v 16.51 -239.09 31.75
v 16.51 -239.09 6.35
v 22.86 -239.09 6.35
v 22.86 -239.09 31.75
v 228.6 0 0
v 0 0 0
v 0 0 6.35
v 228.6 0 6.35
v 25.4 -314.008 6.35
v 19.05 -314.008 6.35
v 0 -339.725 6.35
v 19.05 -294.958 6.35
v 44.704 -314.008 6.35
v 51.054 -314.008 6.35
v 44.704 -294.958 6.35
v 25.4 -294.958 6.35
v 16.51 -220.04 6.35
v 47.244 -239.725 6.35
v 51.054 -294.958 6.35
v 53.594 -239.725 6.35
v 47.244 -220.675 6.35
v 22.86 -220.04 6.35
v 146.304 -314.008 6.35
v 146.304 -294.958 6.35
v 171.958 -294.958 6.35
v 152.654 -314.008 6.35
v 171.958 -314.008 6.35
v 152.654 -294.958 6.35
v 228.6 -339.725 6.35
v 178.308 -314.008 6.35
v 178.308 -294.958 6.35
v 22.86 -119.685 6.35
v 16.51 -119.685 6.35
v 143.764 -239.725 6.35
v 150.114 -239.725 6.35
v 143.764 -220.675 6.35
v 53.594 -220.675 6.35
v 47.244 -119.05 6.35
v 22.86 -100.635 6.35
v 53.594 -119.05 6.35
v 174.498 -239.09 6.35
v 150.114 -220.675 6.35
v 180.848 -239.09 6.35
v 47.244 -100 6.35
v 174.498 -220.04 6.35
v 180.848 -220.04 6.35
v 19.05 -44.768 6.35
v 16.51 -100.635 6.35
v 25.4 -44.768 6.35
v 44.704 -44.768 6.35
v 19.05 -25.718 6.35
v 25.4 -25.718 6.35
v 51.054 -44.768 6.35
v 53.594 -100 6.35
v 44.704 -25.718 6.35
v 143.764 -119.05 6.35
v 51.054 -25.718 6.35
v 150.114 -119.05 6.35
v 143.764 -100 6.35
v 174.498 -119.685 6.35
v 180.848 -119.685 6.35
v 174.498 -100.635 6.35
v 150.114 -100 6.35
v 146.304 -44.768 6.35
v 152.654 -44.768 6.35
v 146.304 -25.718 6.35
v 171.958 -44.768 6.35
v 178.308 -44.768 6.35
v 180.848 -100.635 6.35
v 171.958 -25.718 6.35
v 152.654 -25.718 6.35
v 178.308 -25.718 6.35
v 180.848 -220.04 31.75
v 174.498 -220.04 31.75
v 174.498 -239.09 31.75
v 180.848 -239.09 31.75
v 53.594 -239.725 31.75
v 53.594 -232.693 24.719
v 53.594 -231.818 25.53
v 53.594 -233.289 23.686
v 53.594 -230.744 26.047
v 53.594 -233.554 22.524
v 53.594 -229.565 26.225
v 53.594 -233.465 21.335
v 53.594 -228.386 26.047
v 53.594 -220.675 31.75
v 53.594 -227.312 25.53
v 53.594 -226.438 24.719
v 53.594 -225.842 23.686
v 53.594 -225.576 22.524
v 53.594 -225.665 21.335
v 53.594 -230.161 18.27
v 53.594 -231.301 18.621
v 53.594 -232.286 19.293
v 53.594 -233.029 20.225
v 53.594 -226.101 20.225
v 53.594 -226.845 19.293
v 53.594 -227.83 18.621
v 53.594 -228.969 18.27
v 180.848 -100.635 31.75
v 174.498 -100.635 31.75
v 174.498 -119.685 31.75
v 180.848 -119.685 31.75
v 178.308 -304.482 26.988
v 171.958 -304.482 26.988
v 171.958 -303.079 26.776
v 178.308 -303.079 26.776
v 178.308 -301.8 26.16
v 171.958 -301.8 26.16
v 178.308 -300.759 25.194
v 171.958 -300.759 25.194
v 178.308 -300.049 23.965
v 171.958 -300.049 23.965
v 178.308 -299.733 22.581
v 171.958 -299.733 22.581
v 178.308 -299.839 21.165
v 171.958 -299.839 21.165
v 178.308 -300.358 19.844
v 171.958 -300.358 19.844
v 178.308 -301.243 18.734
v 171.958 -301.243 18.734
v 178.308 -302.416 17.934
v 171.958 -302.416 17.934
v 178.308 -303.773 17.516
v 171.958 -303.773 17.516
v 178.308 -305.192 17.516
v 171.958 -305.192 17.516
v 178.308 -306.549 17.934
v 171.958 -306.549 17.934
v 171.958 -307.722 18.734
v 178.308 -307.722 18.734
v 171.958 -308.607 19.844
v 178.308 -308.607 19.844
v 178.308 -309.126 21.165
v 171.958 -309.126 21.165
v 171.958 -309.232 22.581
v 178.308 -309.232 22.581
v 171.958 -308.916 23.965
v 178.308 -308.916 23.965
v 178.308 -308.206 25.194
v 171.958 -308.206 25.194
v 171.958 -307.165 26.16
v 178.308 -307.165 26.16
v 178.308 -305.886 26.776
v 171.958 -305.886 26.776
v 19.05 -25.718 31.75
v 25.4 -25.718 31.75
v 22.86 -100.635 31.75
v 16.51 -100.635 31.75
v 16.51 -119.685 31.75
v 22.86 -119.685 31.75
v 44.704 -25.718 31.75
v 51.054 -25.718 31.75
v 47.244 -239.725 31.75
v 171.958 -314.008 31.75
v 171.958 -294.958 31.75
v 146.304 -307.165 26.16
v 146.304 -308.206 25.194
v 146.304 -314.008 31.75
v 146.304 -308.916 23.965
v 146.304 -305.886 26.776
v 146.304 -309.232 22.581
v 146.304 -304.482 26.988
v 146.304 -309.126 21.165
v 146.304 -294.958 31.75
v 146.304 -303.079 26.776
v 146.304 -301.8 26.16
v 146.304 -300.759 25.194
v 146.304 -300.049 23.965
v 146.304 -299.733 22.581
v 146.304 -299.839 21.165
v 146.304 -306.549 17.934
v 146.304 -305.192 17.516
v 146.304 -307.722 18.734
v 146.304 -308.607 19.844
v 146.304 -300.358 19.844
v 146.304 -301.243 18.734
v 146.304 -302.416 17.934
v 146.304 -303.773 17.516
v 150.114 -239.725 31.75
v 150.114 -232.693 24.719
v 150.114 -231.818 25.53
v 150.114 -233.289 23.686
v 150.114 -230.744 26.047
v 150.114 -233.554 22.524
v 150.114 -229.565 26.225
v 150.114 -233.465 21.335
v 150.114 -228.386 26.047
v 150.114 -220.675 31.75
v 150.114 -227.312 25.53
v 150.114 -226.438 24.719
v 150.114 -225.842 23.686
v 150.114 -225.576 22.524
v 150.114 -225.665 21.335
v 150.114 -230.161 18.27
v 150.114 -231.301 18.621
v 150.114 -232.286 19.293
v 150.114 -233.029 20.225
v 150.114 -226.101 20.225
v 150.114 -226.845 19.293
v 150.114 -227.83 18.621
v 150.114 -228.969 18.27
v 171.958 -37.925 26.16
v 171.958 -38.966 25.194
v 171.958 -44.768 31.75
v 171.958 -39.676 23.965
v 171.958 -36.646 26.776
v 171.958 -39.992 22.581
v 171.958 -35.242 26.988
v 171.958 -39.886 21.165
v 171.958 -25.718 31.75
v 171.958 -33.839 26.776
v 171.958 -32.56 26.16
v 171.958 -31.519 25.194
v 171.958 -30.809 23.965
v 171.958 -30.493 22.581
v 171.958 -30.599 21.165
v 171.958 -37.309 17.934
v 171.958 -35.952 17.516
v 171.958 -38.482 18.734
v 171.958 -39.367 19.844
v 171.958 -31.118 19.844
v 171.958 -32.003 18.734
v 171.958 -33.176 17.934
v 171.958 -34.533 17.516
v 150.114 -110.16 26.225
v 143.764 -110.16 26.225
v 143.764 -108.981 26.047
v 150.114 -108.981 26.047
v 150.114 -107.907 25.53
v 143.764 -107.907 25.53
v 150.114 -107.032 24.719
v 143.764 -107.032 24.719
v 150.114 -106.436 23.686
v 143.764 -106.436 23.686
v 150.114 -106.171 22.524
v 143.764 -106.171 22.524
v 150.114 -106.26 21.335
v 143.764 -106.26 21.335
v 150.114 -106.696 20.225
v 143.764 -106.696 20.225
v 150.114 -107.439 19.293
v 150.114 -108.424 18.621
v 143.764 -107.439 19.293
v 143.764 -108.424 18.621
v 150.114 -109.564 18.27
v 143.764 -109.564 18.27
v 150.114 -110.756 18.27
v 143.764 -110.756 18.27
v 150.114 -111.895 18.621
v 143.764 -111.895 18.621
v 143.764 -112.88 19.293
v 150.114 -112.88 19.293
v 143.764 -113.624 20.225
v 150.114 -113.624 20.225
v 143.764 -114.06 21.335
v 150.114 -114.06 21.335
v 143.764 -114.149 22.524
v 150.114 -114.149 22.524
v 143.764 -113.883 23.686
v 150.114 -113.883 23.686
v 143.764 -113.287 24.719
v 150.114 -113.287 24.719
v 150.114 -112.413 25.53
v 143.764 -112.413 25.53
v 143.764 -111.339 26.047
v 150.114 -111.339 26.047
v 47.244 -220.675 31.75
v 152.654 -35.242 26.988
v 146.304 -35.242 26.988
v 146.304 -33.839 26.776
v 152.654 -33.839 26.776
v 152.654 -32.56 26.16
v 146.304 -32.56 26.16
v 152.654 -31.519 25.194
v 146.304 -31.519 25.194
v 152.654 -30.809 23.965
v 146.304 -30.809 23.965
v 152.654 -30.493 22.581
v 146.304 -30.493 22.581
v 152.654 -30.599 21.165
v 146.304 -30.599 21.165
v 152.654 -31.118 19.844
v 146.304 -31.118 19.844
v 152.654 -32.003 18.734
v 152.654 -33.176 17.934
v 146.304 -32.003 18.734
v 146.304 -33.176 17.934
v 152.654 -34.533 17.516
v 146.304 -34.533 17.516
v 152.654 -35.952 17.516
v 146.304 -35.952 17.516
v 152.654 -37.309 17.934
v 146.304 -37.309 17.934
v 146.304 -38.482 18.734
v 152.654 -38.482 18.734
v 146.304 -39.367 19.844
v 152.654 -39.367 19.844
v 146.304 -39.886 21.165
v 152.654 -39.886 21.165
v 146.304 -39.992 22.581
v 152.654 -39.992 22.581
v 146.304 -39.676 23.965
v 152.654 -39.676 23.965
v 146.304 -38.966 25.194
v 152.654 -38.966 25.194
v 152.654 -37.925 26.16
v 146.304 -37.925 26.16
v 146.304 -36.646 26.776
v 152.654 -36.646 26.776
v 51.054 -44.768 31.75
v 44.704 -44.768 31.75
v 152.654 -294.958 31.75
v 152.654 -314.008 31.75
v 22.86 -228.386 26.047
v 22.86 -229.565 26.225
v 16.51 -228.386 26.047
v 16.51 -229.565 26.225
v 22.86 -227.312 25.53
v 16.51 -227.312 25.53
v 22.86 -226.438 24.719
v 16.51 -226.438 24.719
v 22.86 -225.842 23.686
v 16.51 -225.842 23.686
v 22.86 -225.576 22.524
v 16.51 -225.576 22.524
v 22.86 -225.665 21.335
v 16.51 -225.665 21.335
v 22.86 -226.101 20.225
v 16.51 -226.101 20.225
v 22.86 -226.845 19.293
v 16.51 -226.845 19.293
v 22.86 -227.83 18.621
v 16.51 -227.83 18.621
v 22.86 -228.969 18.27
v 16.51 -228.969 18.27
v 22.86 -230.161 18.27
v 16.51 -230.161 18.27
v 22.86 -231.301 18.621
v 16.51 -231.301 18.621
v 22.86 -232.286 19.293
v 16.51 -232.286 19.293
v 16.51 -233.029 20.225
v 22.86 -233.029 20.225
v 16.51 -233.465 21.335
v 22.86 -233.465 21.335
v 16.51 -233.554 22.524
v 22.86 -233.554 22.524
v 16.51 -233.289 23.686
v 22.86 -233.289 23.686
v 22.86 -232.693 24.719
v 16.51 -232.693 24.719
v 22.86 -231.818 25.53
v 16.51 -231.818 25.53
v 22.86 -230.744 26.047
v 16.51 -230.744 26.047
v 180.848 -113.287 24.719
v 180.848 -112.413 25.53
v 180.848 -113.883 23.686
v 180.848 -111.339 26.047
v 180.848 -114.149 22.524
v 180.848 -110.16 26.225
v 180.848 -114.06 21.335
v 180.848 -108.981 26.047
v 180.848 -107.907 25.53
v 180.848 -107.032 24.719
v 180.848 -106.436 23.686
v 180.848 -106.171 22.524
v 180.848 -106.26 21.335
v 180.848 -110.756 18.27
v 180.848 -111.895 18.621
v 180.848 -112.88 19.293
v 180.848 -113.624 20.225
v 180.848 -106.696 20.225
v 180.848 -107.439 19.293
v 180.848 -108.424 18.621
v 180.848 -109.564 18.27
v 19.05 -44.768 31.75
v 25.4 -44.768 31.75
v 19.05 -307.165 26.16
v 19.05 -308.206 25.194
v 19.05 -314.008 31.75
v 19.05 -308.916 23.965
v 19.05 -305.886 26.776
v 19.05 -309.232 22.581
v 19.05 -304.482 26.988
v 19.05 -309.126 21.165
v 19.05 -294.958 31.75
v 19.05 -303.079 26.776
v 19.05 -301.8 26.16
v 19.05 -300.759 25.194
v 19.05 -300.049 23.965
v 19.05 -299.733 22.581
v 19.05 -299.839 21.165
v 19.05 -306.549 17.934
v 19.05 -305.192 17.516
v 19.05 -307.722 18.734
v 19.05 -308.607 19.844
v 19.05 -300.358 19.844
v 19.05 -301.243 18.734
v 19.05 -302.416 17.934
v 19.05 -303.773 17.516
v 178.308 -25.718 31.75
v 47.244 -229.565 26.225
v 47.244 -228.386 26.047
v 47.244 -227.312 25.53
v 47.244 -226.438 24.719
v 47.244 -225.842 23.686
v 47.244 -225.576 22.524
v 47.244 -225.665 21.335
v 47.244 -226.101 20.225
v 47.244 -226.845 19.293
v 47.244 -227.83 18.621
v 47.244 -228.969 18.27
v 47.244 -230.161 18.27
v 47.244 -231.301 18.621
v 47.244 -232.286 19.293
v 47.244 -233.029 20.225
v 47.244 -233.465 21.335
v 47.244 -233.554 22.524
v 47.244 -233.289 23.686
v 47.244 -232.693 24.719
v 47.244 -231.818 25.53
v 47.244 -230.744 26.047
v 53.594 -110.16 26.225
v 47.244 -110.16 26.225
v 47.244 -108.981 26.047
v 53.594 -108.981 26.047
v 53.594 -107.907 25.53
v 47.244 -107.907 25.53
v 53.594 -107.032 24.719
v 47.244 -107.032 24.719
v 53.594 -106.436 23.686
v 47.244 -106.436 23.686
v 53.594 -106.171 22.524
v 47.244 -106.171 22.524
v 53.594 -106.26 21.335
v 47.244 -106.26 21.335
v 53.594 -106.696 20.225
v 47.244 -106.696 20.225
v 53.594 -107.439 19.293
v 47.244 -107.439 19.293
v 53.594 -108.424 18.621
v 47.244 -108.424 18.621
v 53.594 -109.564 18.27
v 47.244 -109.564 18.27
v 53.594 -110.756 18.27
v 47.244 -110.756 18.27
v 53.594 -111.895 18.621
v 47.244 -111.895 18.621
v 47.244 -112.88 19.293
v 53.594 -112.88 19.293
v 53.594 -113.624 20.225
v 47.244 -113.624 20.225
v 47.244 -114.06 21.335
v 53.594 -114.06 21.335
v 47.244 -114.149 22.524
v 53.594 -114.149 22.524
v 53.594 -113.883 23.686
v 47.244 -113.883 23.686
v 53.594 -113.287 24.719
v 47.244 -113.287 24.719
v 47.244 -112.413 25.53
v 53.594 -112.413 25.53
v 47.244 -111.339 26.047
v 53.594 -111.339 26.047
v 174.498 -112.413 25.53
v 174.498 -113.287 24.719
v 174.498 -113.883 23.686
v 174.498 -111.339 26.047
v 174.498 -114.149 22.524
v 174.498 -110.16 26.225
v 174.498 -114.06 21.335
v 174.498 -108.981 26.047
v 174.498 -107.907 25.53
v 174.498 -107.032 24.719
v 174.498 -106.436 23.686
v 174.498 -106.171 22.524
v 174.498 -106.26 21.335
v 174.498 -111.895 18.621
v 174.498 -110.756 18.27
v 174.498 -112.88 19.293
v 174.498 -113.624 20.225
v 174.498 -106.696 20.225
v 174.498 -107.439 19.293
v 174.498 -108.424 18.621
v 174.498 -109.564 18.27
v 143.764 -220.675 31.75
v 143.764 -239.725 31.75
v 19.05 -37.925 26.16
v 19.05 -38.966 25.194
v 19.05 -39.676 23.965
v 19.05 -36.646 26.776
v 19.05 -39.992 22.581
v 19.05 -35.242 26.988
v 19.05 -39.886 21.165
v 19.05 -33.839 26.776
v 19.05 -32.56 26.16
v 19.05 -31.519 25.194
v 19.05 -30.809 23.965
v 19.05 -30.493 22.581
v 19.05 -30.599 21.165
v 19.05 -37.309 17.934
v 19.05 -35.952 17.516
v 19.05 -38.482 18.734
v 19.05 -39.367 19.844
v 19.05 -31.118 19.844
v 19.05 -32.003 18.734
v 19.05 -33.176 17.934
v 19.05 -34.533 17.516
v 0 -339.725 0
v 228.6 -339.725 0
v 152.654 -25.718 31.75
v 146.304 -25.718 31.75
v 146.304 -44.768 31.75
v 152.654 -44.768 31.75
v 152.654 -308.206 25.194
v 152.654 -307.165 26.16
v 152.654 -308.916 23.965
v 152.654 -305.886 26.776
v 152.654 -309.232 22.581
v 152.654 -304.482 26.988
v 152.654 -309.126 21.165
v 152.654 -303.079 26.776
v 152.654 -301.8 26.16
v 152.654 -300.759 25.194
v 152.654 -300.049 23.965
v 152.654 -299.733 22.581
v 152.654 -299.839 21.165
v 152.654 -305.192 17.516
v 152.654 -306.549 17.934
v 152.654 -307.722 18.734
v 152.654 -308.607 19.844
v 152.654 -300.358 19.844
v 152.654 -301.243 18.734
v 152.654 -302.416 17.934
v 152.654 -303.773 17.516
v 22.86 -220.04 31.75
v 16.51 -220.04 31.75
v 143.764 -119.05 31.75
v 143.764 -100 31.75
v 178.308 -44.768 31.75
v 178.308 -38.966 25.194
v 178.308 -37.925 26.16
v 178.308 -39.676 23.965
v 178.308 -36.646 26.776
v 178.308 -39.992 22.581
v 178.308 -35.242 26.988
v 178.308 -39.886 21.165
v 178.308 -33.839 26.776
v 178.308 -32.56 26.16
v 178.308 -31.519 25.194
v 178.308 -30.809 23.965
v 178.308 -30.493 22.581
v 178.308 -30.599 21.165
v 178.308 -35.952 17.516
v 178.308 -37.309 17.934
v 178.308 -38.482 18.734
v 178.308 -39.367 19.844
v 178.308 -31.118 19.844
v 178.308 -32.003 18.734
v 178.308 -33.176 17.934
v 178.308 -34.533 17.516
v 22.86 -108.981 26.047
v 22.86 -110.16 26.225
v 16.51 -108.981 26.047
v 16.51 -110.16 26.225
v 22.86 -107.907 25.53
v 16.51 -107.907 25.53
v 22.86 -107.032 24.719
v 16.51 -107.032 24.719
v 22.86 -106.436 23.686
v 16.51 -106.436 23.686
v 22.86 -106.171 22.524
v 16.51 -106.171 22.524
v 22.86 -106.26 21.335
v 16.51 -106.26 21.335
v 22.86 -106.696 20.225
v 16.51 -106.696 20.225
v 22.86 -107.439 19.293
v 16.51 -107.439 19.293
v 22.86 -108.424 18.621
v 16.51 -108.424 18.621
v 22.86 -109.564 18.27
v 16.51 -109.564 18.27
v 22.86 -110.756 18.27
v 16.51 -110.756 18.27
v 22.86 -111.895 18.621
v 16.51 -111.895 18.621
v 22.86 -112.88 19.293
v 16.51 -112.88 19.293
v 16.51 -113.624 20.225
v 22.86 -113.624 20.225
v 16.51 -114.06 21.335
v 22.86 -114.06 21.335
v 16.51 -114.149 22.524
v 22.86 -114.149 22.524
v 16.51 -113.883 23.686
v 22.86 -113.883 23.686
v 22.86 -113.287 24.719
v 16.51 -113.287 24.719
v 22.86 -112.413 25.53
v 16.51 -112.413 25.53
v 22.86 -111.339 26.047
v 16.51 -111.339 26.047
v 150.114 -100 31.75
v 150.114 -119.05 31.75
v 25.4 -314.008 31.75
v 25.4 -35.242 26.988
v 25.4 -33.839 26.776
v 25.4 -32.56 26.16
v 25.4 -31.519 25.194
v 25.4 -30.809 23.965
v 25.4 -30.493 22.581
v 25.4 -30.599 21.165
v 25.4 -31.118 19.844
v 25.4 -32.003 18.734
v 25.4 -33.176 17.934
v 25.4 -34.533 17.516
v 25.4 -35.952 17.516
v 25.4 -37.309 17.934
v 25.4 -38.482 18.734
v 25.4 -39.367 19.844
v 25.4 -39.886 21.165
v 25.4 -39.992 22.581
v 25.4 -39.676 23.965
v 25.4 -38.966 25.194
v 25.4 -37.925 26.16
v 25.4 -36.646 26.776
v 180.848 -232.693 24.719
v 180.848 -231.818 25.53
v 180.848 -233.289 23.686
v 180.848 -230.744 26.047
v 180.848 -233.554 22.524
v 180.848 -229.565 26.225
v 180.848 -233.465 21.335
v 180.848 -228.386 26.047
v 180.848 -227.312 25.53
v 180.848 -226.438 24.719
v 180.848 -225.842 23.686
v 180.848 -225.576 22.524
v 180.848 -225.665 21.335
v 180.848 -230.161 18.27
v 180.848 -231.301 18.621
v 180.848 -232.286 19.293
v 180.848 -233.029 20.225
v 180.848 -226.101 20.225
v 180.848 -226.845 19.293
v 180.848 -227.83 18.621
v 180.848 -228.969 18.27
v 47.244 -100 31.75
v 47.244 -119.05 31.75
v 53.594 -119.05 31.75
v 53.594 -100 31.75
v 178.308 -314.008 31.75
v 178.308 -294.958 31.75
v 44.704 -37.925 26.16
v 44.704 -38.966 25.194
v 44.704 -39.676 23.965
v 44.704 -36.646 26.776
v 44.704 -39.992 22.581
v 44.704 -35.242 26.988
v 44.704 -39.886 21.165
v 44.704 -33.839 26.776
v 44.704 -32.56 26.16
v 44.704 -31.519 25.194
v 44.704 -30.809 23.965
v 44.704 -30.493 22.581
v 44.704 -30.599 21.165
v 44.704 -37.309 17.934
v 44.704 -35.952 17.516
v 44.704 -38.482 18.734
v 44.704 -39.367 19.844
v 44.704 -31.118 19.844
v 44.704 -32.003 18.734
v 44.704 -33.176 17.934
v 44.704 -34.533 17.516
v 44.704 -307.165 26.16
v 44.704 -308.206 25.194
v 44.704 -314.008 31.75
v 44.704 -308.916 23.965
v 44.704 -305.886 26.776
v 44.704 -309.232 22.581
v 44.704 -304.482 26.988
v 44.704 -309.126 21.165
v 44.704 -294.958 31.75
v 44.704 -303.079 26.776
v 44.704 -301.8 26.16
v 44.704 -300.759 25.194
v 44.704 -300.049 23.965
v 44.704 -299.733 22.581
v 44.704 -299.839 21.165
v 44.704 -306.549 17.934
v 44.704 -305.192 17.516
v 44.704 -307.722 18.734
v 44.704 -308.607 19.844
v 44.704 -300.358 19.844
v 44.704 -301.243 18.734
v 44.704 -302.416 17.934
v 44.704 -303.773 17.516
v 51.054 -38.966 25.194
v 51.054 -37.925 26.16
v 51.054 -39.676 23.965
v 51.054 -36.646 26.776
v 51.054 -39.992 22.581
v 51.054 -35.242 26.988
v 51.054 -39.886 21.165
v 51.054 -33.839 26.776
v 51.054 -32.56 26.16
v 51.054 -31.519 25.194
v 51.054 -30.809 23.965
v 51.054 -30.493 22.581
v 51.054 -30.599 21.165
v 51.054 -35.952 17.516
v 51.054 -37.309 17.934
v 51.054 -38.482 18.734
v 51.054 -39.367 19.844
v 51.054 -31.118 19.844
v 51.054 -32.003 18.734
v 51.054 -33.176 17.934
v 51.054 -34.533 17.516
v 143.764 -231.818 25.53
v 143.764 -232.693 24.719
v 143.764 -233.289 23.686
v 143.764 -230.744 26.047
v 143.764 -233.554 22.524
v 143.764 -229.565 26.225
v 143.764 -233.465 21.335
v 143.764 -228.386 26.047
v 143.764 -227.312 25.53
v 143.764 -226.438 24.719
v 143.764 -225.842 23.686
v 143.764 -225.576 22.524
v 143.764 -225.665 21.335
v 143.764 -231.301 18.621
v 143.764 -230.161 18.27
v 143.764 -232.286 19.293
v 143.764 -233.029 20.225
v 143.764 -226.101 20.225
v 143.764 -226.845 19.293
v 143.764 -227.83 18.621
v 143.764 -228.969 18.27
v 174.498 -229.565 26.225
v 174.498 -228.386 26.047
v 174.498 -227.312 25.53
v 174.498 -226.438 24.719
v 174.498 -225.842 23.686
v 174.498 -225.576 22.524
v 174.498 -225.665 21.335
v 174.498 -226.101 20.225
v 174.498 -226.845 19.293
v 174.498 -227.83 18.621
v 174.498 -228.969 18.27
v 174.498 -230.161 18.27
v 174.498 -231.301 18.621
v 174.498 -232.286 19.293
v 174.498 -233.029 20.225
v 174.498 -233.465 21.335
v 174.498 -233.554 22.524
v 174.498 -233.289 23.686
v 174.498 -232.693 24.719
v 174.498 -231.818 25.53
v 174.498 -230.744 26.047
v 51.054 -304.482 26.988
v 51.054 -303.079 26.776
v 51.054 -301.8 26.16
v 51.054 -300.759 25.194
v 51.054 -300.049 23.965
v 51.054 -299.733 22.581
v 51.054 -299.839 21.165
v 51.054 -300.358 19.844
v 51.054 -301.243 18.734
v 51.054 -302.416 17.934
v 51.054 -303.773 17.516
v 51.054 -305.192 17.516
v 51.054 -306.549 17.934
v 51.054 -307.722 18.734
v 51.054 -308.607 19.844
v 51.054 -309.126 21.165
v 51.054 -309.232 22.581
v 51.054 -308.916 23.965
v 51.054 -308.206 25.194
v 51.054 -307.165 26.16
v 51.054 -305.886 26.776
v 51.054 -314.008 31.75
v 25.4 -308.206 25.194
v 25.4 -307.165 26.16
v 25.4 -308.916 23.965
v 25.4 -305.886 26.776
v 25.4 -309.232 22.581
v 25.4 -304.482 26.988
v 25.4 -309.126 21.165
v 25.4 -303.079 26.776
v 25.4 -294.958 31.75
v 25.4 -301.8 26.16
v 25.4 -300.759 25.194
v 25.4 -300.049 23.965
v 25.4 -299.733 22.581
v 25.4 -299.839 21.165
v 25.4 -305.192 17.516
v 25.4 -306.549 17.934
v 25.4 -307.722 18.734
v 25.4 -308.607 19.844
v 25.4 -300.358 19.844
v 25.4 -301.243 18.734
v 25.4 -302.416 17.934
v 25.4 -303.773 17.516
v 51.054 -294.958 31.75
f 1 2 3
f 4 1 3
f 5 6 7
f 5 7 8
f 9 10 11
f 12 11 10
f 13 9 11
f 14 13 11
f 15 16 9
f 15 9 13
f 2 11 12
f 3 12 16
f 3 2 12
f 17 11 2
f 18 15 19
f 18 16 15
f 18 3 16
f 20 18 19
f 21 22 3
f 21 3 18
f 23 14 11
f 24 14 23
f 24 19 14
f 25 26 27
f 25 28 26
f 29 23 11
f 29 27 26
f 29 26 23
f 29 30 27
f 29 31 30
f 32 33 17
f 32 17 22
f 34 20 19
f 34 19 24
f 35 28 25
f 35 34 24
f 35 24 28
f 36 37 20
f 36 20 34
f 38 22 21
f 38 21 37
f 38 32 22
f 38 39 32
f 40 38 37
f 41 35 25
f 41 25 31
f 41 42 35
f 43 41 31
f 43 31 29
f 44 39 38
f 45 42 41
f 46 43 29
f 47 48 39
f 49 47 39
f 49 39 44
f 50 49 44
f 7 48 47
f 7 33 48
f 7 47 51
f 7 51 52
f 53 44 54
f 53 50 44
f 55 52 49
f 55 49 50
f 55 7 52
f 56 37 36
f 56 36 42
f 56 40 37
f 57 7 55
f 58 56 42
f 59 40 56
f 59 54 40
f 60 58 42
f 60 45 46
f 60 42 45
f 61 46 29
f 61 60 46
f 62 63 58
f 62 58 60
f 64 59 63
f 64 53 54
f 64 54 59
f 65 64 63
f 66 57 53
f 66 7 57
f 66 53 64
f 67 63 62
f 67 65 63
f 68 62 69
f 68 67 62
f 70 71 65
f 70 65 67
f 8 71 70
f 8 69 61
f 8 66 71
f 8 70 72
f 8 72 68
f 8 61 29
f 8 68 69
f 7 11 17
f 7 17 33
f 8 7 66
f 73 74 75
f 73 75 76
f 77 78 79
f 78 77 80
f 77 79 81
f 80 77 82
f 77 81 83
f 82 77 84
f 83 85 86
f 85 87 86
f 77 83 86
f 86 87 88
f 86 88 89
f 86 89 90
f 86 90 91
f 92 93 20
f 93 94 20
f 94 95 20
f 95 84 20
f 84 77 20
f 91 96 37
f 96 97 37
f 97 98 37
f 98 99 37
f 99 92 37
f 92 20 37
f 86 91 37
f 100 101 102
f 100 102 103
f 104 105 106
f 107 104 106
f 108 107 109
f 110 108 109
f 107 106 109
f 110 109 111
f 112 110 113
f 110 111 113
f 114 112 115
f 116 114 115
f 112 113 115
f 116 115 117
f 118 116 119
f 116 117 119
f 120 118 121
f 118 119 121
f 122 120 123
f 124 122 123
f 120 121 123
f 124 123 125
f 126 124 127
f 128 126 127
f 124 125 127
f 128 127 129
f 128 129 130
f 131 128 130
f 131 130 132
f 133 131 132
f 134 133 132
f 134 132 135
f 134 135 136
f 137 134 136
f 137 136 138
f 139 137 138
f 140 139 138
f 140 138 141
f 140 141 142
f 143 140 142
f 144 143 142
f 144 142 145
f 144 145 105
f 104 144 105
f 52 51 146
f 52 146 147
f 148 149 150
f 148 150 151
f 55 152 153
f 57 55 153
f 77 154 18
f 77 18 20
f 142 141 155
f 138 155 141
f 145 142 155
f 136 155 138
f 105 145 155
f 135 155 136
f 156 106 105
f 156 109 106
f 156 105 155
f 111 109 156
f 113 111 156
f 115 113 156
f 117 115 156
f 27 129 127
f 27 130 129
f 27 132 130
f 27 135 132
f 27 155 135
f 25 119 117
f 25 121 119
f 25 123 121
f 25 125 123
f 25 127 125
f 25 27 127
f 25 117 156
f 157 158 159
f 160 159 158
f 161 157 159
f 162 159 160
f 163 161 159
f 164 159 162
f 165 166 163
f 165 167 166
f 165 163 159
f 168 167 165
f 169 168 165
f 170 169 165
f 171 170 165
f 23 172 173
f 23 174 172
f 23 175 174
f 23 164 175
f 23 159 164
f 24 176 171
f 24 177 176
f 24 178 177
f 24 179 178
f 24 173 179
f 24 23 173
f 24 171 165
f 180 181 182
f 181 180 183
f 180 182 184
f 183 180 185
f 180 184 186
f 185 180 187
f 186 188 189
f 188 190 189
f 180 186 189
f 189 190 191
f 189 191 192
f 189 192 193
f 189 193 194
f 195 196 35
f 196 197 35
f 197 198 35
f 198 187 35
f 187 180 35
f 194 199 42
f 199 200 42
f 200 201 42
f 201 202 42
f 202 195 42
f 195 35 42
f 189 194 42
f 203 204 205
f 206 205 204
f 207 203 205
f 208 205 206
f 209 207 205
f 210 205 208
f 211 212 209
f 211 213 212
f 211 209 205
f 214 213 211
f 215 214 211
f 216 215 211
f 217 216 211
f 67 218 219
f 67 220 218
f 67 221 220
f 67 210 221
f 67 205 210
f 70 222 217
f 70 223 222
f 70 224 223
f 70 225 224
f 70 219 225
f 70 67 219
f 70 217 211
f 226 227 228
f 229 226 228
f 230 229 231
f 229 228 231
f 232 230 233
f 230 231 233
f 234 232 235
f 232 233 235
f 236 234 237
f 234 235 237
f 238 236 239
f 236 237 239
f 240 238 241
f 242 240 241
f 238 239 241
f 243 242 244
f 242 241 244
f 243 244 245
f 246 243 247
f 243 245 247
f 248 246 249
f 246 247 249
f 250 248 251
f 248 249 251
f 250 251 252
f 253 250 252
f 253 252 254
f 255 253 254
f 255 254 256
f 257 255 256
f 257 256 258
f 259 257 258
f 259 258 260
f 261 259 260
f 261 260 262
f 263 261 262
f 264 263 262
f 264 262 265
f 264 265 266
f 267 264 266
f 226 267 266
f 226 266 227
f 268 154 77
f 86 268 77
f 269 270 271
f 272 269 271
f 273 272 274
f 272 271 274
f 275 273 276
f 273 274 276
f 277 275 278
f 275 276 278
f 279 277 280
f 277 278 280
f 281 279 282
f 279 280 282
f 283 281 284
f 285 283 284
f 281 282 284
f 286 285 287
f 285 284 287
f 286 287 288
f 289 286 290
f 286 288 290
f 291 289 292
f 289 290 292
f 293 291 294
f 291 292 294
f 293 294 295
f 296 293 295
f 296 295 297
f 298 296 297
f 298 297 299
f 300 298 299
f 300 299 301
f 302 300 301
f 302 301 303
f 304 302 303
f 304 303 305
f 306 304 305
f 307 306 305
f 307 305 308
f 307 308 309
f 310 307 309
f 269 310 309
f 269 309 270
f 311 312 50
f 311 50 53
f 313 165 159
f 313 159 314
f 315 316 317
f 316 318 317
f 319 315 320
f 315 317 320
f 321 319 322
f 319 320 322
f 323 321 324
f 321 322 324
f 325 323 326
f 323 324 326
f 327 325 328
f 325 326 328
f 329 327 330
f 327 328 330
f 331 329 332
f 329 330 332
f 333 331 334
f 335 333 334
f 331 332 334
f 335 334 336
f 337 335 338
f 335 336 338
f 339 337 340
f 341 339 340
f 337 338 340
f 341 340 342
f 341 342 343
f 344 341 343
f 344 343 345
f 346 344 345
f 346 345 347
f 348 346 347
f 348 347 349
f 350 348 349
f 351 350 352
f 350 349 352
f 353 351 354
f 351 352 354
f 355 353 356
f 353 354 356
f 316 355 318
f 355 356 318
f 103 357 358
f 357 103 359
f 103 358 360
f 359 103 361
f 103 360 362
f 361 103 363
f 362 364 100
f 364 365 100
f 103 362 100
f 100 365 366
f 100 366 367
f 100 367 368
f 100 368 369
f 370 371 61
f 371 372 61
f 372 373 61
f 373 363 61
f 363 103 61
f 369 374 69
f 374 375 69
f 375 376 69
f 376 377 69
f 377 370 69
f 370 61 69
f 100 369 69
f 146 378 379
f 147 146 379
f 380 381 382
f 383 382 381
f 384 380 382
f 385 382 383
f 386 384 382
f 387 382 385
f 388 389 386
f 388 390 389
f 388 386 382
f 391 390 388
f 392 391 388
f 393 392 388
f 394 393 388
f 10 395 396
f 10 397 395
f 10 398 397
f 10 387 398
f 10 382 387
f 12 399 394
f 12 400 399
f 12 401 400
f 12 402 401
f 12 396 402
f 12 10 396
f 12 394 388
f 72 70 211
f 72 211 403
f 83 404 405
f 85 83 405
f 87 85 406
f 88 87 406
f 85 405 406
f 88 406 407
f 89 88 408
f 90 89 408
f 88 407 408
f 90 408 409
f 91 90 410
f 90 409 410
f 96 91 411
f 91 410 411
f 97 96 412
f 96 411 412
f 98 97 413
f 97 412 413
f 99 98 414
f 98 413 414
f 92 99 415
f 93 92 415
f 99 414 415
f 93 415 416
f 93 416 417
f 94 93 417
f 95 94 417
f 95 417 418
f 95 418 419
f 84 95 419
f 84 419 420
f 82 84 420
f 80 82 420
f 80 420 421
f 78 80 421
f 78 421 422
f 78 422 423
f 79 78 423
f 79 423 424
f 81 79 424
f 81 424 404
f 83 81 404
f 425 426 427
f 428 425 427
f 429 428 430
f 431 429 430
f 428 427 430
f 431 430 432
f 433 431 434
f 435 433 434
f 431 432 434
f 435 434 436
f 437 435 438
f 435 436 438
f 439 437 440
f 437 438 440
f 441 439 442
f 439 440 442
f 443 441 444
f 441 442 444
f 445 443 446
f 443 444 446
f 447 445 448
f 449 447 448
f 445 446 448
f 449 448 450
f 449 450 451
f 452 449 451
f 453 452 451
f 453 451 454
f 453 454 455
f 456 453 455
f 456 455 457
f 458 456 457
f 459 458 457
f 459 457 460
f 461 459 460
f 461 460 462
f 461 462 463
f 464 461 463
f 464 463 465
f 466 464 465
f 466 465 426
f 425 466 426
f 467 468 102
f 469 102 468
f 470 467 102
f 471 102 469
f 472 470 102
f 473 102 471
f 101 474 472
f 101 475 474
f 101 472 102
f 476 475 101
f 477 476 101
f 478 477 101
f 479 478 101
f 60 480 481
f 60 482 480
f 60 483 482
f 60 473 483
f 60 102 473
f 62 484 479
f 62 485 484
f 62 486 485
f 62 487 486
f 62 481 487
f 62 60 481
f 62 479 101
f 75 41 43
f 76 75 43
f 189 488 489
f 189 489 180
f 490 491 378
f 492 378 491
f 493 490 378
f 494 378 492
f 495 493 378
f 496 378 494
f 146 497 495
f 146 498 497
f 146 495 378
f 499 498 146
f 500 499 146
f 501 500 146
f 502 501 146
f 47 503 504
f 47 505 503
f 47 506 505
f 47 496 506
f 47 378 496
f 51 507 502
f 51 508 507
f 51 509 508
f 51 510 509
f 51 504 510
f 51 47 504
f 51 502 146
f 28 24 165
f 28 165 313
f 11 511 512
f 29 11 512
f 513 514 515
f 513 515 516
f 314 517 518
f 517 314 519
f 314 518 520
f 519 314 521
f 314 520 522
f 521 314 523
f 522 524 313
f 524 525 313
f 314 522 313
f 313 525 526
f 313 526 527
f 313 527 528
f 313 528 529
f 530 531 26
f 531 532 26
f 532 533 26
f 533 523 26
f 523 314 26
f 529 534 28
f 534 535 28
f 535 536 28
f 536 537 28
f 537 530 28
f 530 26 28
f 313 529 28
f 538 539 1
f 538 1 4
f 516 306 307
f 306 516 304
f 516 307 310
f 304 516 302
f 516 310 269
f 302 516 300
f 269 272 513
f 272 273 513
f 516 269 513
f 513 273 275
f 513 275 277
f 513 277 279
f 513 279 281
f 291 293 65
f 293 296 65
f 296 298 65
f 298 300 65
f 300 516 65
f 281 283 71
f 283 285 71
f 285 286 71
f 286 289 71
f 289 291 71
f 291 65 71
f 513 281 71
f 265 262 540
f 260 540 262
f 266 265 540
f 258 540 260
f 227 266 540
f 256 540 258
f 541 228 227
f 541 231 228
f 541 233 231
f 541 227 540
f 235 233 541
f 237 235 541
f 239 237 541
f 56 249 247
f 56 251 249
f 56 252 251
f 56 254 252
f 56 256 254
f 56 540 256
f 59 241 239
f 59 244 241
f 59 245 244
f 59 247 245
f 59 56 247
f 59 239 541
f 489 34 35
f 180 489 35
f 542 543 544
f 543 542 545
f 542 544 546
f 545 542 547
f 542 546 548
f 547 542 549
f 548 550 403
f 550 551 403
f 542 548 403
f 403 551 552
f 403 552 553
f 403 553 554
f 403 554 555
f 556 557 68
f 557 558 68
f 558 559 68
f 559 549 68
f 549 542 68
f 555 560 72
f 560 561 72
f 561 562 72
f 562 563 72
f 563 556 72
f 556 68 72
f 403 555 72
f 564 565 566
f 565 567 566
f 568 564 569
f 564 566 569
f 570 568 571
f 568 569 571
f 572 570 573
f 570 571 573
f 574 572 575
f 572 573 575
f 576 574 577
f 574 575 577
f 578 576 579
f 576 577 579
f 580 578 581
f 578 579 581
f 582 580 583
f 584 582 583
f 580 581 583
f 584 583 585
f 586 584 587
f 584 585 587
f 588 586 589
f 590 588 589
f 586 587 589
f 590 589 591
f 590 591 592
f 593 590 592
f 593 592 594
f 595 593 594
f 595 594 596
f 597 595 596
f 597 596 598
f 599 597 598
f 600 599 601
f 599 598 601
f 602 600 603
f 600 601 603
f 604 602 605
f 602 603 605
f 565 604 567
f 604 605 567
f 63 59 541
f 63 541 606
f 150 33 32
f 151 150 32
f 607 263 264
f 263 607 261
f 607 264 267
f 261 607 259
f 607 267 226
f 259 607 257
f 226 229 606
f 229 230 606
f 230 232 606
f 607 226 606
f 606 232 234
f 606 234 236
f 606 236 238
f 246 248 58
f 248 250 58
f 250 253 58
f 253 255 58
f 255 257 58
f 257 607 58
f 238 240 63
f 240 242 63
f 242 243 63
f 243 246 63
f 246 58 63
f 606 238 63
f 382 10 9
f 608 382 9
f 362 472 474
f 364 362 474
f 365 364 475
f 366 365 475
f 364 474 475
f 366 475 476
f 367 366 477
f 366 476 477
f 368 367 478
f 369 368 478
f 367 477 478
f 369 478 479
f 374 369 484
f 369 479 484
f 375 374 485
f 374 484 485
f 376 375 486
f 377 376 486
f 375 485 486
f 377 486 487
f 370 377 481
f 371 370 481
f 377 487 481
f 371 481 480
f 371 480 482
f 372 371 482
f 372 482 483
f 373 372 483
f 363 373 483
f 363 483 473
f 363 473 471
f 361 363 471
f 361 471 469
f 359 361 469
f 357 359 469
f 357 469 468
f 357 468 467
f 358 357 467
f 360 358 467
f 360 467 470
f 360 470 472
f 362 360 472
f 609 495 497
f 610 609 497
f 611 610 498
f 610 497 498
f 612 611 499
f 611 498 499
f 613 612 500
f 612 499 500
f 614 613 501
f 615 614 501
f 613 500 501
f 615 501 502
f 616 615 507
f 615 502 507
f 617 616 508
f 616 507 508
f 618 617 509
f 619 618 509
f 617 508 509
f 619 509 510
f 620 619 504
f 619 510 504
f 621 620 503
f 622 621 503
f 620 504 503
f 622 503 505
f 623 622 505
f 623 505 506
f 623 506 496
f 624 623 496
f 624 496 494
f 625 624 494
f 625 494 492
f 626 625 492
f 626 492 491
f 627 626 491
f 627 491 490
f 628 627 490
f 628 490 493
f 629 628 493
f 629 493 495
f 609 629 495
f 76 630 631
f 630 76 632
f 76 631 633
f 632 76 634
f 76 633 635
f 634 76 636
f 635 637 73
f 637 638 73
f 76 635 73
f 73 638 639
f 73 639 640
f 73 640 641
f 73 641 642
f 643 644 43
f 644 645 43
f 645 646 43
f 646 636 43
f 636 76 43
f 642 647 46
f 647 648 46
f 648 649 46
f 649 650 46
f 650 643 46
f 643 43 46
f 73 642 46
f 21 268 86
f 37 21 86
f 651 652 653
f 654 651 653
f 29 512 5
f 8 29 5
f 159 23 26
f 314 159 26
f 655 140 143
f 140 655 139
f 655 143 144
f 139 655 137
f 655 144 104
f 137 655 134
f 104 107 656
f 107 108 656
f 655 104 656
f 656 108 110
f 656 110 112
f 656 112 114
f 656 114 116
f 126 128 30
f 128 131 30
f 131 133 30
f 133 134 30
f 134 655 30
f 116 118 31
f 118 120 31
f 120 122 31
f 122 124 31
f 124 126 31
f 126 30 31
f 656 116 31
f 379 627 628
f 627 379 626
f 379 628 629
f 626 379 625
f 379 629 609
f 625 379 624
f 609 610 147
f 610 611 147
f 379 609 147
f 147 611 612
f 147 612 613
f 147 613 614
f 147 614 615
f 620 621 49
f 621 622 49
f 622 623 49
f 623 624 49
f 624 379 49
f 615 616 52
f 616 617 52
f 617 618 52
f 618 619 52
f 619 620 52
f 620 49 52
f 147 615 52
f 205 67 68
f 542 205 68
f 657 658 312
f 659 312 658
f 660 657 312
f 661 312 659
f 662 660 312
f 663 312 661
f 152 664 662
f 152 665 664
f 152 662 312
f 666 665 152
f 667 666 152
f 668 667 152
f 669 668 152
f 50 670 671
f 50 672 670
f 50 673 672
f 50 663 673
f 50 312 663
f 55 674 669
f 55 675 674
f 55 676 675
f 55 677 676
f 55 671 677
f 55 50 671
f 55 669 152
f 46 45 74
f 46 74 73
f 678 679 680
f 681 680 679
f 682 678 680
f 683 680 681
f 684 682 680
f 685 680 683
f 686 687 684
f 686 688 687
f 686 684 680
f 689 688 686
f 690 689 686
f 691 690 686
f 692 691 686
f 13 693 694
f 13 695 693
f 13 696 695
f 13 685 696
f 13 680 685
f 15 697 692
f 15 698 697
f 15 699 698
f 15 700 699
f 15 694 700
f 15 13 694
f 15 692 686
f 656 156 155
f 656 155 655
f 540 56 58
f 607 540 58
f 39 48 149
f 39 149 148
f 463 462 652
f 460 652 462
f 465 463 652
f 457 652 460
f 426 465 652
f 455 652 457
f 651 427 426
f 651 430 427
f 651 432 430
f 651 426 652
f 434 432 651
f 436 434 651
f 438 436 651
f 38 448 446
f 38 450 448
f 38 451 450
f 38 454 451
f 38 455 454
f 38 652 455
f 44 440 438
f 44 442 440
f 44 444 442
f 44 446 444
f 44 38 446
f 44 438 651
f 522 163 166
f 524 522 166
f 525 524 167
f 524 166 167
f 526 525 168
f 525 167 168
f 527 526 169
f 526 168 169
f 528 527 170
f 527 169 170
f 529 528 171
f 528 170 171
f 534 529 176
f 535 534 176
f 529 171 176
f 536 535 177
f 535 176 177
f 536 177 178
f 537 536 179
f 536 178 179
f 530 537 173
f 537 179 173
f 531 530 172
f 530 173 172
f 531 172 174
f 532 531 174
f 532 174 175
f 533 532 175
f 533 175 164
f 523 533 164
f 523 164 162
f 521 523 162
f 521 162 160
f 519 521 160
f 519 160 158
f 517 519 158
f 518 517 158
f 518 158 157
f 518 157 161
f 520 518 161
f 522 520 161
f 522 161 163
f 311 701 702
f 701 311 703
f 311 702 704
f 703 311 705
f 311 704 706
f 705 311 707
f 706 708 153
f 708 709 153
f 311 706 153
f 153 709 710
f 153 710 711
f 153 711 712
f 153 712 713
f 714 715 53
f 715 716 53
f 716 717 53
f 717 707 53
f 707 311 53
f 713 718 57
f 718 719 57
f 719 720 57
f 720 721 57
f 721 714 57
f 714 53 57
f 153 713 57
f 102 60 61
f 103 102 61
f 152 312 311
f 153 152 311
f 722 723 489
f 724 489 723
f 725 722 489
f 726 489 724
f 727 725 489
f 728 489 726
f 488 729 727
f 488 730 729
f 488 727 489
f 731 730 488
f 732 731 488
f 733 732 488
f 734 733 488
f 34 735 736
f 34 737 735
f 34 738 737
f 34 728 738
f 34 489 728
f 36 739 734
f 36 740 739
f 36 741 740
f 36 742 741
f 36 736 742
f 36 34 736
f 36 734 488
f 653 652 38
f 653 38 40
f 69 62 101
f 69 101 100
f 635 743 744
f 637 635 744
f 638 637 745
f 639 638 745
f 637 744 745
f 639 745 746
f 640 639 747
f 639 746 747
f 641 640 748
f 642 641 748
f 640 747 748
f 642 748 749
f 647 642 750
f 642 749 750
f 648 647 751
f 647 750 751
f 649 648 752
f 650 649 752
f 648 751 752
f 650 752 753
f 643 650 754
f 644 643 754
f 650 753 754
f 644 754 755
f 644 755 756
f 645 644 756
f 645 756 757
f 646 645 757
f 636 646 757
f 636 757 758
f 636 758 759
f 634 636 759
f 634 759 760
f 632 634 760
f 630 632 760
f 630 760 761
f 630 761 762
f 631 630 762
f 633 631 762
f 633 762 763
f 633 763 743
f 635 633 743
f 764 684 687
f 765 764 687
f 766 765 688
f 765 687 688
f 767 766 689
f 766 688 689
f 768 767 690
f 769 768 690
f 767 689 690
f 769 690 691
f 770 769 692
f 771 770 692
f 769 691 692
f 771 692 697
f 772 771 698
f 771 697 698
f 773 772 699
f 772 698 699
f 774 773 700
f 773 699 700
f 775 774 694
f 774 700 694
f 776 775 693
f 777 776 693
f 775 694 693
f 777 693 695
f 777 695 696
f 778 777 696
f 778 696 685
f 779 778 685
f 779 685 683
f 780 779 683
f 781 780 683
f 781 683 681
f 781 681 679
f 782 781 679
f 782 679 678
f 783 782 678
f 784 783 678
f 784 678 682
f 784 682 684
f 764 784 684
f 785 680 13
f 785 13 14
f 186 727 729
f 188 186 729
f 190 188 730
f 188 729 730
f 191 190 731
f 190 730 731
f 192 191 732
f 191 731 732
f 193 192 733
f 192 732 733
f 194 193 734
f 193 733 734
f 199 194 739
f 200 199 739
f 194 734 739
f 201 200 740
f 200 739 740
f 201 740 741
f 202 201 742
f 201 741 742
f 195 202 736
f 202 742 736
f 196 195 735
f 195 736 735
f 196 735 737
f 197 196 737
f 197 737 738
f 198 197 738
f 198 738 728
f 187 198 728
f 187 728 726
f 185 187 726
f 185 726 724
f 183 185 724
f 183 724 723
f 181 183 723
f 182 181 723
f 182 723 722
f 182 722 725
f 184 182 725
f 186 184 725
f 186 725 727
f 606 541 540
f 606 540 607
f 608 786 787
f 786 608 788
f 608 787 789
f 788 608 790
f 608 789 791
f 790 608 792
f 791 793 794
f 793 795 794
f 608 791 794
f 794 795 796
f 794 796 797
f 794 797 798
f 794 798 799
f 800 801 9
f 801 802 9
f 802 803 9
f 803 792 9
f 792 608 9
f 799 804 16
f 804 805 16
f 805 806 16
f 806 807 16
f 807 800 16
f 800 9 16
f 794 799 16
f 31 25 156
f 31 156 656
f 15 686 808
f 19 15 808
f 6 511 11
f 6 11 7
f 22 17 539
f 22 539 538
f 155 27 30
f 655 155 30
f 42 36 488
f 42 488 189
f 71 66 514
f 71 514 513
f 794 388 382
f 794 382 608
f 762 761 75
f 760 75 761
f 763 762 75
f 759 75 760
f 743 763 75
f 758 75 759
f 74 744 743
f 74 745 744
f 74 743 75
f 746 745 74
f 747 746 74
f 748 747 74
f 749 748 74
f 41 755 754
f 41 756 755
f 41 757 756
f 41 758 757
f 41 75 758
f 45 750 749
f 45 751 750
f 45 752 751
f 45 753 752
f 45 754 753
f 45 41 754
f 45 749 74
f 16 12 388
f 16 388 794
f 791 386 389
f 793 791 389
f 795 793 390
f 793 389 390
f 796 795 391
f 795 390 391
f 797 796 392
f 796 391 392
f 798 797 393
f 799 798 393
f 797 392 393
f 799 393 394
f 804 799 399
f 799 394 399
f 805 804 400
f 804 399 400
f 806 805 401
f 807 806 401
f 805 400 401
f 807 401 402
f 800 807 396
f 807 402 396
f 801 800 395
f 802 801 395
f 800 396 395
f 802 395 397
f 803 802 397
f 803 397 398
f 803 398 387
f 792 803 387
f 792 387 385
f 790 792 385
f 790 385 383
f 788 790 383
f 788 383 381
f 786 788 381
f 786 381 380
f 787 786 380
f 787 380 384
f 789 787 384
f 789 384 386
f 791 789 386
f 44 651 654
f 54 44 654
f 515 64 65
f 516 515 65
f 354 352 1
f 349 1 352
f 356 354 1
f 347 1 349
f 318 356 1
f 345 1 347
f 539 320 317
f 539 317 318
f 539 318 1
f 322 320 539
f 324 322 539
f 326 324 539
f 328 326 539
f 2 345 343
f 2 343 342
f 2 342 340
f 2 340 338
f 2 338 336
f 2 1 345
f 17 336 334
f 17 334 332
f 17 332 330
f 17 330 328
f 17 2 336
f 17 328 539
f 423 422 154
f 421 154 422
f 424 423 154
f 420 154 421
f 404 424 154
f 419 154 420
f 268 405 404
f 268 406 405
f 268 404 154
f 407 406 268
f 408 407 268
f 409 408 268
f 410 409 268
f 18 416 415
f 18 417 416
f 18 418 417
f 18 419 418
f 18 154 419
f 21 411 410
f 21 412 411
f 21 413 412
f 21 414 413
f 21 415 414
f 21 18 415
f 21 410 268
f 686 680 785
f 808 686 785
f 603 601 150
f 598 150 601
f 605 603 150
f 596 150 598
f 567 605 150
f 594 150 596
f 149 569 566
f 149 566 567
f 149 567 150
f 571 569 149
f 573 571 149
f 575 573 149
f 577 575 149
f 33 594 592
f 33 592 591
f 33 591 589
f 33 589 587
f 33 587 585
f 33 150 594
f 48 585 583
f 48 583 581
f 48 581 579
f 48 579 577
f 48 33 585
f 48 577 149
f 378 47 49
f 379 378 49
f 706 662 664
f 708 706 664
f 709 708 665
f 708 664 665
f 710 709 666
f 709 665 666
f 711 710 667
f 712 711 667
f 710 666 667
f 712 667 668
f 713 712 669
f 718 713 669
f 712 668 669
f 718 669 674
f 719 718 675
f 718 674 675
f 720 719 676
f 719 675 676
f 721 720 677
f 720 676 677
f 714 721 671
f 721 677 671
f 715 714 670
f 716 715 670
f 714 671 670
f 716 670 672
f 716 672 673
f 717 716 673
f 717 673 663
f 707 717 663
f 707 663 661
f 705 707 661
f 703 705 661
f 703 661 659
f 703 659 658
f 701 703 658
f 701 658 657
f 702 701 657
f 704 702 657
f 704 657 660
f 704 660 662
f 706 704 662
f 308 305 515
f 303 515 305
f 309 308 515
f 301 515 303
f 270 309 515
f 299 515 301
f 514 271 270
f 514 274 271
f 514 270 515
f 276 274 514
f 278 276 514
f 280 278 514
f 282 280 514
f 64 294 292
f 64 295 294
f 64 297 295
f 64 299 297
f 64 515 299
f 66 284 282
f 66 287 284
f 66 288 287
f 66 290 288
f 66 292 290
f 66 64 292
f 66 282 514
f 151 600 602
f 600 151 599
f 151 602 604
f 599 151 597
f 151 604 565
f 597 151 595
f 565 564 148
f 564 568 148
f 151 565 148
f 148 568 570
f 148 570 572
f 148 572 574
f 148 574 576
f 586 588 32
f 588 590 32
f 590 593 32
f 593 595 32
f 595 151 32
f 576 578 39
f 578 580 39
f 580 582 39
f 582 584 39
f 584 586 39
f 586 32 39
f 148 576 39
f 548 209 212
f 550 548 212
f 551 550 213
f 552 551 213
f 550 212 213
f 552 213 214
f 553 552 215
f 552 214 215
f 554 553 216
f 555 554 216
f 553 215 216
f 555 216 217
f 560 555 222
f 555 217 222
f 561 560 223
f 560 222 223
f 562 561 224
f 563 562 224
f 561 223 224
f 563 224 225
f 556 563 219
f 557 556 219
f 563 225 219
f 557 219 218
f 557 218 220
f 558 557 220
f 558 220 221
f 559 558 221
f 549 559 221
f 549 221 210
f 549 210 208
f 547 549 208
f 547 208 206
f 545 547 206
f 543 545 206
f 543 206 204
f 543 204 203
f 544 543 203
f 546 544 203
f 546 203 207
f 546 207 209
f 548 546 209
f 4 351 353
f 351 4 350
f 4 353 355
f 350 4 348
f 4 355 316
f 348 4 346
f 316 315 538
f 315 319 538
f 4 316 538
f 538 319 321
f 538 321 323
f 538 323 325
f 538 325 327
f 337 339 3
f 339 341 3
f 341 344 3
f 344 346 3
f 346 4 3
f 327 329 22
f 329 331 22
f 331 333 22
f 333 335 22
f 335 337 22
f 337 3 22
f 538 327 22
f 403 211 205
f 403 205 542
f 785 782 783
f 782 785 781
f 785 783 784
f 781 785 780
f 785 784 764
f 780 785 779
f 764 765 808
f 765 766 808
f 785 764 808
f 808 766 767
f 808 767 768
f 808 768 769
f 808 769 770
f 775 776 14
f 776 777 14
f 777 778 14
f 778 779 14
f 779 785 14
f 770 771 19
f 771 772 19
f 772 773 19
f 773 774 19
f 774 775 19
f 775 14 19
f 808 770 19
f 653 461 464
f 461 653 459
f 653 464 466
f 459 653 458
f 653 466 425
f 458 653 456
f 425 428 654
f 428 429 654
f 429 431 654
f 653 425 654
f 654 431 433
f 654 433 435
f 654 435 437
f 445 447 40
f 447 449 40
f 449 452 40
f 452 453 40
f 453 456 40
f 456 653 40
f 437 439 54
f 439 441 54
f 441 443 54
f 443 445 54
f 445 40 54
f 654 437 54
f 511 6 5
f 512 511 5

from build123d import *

# Parameters (mm, degrees)
SKETCH1_W               = 228.6
SKETCH1_H               = 339.725
BOSS_EXTRUDE1_DEPTH     = 6.35
SKETCH2_W               = 6.35
SKETCH2_H               = 19.05
BOSS_EXTRUDE2_DEPTH     = 25.4
SKETCH3_R               = 4.7625
SKETCH3_R_2             = 4
CUT_EXTRUDE1_DEPTH      = 20.05
CUT_EXTRUDE1_DEPTH_BACK = 210.55


with BuildPart() as part:
    # Sketch1 → Boss-Extrude1 (new body)
    with BuildSketch(Plane.XY):
        with Locations((114.3, -169.8625)):
            Rectangle(SKETCH1_W, SKETCH1_H)
    extrude(amount=BOSS_EXTRUDE1_DEPTH)

    # Sketch2 → Boss-Extrude2 (add)
    with BuildSketch(Plane.XY.offset(6.35)):
        with Locations((22.225, -35.2425)):
            Rectangle(SKETCH2_W, SKETCH2_H)
        with Locations((47.879, -35.2425)):
            Rectangle(SKETCH2_W, SKETCH2_H)
        with Locations((149.479, -35.2425)):
            Rectangle(SKETCH2_W, SKETCH2_H)
        with Locations((175.133, -35.2425)):
            Rectangle(SKETCH2_W, SKETCH2_H)
        with Locations((22.225, -304.4825)):
            Rectangle(SKETCH2_W, SKETCH2_H)
        with Locations((47.879, -304.4825)):
            Rectangle(SKETCH2_W, SKETCH2_H)
        with Locations((149.479, -304.4825)):
            Rectangle(SKETCH2_W, SKETCH2_H)
        with Locations((175.133, -304.4825)):
            Rectangle(SKETCH2_W, SKETCH2_H)
        with Locations((19.685, -110.1598)):
            Rectangle(SKETCH2_W, SKETCH2_H)
        with Locations((50.419, -109.5248)):
            Rectangle(SKETCH2_W, SKETCH2_H)
        with Locations((146.939, -109.5248)):
            Rectangle(SKETCH2_W, SKETCH2_H)
        with Locations((177.673, -110.1598)):
            Rectangle(SKETCH2_W, SKETCH2_H)
        with Locations((177.673, -229.5652)):
            Rectangle(SKETCH2_W, SKETCH2_H)
        with Locations((146.939, -230.2002)):
            Rectangle(SKETCH2_W, SKETCH2_H)
        with Locations((50.419, -230.2002)):
            Rectangle(SKETCH2_W, SKETCH2_H)
        with Locations((19.685, -229.5652)):
            Rectangle(SKETCH2_W, SKETCH2_H)
    extrude(amount=BOSS_EXTRUDE2_DEPTH)

    # Sketch3 → Cut-Extrude1 (cut, two sides)
    with BuildSketch(Plane.ZY.offset(-19.05)) as cut_extrude1_sk:
        with Locations((22.225, -35.2425)):
            Circle(SKETCH3_R)
        with Locations((22.225, -229.5652)):
            Circle(SKETCH3_R_2)
        with Locations((22.225, -304.4825)):
            Circle(SKETCH3_R)
        with Locations((22.225, -110.1598)):
            Circle(SKETCH3_R_2)
    extrude(amount=CUT_EXTRUDE1_DEPTH, mode=Mode.SUBTRACT)
    extrude(cut_extrude1_sk.sketch, amount=-CUT_EXTRUDE1_DEPTH_BACK, mode=Mode.SUBTRACT)


solid = part.part
